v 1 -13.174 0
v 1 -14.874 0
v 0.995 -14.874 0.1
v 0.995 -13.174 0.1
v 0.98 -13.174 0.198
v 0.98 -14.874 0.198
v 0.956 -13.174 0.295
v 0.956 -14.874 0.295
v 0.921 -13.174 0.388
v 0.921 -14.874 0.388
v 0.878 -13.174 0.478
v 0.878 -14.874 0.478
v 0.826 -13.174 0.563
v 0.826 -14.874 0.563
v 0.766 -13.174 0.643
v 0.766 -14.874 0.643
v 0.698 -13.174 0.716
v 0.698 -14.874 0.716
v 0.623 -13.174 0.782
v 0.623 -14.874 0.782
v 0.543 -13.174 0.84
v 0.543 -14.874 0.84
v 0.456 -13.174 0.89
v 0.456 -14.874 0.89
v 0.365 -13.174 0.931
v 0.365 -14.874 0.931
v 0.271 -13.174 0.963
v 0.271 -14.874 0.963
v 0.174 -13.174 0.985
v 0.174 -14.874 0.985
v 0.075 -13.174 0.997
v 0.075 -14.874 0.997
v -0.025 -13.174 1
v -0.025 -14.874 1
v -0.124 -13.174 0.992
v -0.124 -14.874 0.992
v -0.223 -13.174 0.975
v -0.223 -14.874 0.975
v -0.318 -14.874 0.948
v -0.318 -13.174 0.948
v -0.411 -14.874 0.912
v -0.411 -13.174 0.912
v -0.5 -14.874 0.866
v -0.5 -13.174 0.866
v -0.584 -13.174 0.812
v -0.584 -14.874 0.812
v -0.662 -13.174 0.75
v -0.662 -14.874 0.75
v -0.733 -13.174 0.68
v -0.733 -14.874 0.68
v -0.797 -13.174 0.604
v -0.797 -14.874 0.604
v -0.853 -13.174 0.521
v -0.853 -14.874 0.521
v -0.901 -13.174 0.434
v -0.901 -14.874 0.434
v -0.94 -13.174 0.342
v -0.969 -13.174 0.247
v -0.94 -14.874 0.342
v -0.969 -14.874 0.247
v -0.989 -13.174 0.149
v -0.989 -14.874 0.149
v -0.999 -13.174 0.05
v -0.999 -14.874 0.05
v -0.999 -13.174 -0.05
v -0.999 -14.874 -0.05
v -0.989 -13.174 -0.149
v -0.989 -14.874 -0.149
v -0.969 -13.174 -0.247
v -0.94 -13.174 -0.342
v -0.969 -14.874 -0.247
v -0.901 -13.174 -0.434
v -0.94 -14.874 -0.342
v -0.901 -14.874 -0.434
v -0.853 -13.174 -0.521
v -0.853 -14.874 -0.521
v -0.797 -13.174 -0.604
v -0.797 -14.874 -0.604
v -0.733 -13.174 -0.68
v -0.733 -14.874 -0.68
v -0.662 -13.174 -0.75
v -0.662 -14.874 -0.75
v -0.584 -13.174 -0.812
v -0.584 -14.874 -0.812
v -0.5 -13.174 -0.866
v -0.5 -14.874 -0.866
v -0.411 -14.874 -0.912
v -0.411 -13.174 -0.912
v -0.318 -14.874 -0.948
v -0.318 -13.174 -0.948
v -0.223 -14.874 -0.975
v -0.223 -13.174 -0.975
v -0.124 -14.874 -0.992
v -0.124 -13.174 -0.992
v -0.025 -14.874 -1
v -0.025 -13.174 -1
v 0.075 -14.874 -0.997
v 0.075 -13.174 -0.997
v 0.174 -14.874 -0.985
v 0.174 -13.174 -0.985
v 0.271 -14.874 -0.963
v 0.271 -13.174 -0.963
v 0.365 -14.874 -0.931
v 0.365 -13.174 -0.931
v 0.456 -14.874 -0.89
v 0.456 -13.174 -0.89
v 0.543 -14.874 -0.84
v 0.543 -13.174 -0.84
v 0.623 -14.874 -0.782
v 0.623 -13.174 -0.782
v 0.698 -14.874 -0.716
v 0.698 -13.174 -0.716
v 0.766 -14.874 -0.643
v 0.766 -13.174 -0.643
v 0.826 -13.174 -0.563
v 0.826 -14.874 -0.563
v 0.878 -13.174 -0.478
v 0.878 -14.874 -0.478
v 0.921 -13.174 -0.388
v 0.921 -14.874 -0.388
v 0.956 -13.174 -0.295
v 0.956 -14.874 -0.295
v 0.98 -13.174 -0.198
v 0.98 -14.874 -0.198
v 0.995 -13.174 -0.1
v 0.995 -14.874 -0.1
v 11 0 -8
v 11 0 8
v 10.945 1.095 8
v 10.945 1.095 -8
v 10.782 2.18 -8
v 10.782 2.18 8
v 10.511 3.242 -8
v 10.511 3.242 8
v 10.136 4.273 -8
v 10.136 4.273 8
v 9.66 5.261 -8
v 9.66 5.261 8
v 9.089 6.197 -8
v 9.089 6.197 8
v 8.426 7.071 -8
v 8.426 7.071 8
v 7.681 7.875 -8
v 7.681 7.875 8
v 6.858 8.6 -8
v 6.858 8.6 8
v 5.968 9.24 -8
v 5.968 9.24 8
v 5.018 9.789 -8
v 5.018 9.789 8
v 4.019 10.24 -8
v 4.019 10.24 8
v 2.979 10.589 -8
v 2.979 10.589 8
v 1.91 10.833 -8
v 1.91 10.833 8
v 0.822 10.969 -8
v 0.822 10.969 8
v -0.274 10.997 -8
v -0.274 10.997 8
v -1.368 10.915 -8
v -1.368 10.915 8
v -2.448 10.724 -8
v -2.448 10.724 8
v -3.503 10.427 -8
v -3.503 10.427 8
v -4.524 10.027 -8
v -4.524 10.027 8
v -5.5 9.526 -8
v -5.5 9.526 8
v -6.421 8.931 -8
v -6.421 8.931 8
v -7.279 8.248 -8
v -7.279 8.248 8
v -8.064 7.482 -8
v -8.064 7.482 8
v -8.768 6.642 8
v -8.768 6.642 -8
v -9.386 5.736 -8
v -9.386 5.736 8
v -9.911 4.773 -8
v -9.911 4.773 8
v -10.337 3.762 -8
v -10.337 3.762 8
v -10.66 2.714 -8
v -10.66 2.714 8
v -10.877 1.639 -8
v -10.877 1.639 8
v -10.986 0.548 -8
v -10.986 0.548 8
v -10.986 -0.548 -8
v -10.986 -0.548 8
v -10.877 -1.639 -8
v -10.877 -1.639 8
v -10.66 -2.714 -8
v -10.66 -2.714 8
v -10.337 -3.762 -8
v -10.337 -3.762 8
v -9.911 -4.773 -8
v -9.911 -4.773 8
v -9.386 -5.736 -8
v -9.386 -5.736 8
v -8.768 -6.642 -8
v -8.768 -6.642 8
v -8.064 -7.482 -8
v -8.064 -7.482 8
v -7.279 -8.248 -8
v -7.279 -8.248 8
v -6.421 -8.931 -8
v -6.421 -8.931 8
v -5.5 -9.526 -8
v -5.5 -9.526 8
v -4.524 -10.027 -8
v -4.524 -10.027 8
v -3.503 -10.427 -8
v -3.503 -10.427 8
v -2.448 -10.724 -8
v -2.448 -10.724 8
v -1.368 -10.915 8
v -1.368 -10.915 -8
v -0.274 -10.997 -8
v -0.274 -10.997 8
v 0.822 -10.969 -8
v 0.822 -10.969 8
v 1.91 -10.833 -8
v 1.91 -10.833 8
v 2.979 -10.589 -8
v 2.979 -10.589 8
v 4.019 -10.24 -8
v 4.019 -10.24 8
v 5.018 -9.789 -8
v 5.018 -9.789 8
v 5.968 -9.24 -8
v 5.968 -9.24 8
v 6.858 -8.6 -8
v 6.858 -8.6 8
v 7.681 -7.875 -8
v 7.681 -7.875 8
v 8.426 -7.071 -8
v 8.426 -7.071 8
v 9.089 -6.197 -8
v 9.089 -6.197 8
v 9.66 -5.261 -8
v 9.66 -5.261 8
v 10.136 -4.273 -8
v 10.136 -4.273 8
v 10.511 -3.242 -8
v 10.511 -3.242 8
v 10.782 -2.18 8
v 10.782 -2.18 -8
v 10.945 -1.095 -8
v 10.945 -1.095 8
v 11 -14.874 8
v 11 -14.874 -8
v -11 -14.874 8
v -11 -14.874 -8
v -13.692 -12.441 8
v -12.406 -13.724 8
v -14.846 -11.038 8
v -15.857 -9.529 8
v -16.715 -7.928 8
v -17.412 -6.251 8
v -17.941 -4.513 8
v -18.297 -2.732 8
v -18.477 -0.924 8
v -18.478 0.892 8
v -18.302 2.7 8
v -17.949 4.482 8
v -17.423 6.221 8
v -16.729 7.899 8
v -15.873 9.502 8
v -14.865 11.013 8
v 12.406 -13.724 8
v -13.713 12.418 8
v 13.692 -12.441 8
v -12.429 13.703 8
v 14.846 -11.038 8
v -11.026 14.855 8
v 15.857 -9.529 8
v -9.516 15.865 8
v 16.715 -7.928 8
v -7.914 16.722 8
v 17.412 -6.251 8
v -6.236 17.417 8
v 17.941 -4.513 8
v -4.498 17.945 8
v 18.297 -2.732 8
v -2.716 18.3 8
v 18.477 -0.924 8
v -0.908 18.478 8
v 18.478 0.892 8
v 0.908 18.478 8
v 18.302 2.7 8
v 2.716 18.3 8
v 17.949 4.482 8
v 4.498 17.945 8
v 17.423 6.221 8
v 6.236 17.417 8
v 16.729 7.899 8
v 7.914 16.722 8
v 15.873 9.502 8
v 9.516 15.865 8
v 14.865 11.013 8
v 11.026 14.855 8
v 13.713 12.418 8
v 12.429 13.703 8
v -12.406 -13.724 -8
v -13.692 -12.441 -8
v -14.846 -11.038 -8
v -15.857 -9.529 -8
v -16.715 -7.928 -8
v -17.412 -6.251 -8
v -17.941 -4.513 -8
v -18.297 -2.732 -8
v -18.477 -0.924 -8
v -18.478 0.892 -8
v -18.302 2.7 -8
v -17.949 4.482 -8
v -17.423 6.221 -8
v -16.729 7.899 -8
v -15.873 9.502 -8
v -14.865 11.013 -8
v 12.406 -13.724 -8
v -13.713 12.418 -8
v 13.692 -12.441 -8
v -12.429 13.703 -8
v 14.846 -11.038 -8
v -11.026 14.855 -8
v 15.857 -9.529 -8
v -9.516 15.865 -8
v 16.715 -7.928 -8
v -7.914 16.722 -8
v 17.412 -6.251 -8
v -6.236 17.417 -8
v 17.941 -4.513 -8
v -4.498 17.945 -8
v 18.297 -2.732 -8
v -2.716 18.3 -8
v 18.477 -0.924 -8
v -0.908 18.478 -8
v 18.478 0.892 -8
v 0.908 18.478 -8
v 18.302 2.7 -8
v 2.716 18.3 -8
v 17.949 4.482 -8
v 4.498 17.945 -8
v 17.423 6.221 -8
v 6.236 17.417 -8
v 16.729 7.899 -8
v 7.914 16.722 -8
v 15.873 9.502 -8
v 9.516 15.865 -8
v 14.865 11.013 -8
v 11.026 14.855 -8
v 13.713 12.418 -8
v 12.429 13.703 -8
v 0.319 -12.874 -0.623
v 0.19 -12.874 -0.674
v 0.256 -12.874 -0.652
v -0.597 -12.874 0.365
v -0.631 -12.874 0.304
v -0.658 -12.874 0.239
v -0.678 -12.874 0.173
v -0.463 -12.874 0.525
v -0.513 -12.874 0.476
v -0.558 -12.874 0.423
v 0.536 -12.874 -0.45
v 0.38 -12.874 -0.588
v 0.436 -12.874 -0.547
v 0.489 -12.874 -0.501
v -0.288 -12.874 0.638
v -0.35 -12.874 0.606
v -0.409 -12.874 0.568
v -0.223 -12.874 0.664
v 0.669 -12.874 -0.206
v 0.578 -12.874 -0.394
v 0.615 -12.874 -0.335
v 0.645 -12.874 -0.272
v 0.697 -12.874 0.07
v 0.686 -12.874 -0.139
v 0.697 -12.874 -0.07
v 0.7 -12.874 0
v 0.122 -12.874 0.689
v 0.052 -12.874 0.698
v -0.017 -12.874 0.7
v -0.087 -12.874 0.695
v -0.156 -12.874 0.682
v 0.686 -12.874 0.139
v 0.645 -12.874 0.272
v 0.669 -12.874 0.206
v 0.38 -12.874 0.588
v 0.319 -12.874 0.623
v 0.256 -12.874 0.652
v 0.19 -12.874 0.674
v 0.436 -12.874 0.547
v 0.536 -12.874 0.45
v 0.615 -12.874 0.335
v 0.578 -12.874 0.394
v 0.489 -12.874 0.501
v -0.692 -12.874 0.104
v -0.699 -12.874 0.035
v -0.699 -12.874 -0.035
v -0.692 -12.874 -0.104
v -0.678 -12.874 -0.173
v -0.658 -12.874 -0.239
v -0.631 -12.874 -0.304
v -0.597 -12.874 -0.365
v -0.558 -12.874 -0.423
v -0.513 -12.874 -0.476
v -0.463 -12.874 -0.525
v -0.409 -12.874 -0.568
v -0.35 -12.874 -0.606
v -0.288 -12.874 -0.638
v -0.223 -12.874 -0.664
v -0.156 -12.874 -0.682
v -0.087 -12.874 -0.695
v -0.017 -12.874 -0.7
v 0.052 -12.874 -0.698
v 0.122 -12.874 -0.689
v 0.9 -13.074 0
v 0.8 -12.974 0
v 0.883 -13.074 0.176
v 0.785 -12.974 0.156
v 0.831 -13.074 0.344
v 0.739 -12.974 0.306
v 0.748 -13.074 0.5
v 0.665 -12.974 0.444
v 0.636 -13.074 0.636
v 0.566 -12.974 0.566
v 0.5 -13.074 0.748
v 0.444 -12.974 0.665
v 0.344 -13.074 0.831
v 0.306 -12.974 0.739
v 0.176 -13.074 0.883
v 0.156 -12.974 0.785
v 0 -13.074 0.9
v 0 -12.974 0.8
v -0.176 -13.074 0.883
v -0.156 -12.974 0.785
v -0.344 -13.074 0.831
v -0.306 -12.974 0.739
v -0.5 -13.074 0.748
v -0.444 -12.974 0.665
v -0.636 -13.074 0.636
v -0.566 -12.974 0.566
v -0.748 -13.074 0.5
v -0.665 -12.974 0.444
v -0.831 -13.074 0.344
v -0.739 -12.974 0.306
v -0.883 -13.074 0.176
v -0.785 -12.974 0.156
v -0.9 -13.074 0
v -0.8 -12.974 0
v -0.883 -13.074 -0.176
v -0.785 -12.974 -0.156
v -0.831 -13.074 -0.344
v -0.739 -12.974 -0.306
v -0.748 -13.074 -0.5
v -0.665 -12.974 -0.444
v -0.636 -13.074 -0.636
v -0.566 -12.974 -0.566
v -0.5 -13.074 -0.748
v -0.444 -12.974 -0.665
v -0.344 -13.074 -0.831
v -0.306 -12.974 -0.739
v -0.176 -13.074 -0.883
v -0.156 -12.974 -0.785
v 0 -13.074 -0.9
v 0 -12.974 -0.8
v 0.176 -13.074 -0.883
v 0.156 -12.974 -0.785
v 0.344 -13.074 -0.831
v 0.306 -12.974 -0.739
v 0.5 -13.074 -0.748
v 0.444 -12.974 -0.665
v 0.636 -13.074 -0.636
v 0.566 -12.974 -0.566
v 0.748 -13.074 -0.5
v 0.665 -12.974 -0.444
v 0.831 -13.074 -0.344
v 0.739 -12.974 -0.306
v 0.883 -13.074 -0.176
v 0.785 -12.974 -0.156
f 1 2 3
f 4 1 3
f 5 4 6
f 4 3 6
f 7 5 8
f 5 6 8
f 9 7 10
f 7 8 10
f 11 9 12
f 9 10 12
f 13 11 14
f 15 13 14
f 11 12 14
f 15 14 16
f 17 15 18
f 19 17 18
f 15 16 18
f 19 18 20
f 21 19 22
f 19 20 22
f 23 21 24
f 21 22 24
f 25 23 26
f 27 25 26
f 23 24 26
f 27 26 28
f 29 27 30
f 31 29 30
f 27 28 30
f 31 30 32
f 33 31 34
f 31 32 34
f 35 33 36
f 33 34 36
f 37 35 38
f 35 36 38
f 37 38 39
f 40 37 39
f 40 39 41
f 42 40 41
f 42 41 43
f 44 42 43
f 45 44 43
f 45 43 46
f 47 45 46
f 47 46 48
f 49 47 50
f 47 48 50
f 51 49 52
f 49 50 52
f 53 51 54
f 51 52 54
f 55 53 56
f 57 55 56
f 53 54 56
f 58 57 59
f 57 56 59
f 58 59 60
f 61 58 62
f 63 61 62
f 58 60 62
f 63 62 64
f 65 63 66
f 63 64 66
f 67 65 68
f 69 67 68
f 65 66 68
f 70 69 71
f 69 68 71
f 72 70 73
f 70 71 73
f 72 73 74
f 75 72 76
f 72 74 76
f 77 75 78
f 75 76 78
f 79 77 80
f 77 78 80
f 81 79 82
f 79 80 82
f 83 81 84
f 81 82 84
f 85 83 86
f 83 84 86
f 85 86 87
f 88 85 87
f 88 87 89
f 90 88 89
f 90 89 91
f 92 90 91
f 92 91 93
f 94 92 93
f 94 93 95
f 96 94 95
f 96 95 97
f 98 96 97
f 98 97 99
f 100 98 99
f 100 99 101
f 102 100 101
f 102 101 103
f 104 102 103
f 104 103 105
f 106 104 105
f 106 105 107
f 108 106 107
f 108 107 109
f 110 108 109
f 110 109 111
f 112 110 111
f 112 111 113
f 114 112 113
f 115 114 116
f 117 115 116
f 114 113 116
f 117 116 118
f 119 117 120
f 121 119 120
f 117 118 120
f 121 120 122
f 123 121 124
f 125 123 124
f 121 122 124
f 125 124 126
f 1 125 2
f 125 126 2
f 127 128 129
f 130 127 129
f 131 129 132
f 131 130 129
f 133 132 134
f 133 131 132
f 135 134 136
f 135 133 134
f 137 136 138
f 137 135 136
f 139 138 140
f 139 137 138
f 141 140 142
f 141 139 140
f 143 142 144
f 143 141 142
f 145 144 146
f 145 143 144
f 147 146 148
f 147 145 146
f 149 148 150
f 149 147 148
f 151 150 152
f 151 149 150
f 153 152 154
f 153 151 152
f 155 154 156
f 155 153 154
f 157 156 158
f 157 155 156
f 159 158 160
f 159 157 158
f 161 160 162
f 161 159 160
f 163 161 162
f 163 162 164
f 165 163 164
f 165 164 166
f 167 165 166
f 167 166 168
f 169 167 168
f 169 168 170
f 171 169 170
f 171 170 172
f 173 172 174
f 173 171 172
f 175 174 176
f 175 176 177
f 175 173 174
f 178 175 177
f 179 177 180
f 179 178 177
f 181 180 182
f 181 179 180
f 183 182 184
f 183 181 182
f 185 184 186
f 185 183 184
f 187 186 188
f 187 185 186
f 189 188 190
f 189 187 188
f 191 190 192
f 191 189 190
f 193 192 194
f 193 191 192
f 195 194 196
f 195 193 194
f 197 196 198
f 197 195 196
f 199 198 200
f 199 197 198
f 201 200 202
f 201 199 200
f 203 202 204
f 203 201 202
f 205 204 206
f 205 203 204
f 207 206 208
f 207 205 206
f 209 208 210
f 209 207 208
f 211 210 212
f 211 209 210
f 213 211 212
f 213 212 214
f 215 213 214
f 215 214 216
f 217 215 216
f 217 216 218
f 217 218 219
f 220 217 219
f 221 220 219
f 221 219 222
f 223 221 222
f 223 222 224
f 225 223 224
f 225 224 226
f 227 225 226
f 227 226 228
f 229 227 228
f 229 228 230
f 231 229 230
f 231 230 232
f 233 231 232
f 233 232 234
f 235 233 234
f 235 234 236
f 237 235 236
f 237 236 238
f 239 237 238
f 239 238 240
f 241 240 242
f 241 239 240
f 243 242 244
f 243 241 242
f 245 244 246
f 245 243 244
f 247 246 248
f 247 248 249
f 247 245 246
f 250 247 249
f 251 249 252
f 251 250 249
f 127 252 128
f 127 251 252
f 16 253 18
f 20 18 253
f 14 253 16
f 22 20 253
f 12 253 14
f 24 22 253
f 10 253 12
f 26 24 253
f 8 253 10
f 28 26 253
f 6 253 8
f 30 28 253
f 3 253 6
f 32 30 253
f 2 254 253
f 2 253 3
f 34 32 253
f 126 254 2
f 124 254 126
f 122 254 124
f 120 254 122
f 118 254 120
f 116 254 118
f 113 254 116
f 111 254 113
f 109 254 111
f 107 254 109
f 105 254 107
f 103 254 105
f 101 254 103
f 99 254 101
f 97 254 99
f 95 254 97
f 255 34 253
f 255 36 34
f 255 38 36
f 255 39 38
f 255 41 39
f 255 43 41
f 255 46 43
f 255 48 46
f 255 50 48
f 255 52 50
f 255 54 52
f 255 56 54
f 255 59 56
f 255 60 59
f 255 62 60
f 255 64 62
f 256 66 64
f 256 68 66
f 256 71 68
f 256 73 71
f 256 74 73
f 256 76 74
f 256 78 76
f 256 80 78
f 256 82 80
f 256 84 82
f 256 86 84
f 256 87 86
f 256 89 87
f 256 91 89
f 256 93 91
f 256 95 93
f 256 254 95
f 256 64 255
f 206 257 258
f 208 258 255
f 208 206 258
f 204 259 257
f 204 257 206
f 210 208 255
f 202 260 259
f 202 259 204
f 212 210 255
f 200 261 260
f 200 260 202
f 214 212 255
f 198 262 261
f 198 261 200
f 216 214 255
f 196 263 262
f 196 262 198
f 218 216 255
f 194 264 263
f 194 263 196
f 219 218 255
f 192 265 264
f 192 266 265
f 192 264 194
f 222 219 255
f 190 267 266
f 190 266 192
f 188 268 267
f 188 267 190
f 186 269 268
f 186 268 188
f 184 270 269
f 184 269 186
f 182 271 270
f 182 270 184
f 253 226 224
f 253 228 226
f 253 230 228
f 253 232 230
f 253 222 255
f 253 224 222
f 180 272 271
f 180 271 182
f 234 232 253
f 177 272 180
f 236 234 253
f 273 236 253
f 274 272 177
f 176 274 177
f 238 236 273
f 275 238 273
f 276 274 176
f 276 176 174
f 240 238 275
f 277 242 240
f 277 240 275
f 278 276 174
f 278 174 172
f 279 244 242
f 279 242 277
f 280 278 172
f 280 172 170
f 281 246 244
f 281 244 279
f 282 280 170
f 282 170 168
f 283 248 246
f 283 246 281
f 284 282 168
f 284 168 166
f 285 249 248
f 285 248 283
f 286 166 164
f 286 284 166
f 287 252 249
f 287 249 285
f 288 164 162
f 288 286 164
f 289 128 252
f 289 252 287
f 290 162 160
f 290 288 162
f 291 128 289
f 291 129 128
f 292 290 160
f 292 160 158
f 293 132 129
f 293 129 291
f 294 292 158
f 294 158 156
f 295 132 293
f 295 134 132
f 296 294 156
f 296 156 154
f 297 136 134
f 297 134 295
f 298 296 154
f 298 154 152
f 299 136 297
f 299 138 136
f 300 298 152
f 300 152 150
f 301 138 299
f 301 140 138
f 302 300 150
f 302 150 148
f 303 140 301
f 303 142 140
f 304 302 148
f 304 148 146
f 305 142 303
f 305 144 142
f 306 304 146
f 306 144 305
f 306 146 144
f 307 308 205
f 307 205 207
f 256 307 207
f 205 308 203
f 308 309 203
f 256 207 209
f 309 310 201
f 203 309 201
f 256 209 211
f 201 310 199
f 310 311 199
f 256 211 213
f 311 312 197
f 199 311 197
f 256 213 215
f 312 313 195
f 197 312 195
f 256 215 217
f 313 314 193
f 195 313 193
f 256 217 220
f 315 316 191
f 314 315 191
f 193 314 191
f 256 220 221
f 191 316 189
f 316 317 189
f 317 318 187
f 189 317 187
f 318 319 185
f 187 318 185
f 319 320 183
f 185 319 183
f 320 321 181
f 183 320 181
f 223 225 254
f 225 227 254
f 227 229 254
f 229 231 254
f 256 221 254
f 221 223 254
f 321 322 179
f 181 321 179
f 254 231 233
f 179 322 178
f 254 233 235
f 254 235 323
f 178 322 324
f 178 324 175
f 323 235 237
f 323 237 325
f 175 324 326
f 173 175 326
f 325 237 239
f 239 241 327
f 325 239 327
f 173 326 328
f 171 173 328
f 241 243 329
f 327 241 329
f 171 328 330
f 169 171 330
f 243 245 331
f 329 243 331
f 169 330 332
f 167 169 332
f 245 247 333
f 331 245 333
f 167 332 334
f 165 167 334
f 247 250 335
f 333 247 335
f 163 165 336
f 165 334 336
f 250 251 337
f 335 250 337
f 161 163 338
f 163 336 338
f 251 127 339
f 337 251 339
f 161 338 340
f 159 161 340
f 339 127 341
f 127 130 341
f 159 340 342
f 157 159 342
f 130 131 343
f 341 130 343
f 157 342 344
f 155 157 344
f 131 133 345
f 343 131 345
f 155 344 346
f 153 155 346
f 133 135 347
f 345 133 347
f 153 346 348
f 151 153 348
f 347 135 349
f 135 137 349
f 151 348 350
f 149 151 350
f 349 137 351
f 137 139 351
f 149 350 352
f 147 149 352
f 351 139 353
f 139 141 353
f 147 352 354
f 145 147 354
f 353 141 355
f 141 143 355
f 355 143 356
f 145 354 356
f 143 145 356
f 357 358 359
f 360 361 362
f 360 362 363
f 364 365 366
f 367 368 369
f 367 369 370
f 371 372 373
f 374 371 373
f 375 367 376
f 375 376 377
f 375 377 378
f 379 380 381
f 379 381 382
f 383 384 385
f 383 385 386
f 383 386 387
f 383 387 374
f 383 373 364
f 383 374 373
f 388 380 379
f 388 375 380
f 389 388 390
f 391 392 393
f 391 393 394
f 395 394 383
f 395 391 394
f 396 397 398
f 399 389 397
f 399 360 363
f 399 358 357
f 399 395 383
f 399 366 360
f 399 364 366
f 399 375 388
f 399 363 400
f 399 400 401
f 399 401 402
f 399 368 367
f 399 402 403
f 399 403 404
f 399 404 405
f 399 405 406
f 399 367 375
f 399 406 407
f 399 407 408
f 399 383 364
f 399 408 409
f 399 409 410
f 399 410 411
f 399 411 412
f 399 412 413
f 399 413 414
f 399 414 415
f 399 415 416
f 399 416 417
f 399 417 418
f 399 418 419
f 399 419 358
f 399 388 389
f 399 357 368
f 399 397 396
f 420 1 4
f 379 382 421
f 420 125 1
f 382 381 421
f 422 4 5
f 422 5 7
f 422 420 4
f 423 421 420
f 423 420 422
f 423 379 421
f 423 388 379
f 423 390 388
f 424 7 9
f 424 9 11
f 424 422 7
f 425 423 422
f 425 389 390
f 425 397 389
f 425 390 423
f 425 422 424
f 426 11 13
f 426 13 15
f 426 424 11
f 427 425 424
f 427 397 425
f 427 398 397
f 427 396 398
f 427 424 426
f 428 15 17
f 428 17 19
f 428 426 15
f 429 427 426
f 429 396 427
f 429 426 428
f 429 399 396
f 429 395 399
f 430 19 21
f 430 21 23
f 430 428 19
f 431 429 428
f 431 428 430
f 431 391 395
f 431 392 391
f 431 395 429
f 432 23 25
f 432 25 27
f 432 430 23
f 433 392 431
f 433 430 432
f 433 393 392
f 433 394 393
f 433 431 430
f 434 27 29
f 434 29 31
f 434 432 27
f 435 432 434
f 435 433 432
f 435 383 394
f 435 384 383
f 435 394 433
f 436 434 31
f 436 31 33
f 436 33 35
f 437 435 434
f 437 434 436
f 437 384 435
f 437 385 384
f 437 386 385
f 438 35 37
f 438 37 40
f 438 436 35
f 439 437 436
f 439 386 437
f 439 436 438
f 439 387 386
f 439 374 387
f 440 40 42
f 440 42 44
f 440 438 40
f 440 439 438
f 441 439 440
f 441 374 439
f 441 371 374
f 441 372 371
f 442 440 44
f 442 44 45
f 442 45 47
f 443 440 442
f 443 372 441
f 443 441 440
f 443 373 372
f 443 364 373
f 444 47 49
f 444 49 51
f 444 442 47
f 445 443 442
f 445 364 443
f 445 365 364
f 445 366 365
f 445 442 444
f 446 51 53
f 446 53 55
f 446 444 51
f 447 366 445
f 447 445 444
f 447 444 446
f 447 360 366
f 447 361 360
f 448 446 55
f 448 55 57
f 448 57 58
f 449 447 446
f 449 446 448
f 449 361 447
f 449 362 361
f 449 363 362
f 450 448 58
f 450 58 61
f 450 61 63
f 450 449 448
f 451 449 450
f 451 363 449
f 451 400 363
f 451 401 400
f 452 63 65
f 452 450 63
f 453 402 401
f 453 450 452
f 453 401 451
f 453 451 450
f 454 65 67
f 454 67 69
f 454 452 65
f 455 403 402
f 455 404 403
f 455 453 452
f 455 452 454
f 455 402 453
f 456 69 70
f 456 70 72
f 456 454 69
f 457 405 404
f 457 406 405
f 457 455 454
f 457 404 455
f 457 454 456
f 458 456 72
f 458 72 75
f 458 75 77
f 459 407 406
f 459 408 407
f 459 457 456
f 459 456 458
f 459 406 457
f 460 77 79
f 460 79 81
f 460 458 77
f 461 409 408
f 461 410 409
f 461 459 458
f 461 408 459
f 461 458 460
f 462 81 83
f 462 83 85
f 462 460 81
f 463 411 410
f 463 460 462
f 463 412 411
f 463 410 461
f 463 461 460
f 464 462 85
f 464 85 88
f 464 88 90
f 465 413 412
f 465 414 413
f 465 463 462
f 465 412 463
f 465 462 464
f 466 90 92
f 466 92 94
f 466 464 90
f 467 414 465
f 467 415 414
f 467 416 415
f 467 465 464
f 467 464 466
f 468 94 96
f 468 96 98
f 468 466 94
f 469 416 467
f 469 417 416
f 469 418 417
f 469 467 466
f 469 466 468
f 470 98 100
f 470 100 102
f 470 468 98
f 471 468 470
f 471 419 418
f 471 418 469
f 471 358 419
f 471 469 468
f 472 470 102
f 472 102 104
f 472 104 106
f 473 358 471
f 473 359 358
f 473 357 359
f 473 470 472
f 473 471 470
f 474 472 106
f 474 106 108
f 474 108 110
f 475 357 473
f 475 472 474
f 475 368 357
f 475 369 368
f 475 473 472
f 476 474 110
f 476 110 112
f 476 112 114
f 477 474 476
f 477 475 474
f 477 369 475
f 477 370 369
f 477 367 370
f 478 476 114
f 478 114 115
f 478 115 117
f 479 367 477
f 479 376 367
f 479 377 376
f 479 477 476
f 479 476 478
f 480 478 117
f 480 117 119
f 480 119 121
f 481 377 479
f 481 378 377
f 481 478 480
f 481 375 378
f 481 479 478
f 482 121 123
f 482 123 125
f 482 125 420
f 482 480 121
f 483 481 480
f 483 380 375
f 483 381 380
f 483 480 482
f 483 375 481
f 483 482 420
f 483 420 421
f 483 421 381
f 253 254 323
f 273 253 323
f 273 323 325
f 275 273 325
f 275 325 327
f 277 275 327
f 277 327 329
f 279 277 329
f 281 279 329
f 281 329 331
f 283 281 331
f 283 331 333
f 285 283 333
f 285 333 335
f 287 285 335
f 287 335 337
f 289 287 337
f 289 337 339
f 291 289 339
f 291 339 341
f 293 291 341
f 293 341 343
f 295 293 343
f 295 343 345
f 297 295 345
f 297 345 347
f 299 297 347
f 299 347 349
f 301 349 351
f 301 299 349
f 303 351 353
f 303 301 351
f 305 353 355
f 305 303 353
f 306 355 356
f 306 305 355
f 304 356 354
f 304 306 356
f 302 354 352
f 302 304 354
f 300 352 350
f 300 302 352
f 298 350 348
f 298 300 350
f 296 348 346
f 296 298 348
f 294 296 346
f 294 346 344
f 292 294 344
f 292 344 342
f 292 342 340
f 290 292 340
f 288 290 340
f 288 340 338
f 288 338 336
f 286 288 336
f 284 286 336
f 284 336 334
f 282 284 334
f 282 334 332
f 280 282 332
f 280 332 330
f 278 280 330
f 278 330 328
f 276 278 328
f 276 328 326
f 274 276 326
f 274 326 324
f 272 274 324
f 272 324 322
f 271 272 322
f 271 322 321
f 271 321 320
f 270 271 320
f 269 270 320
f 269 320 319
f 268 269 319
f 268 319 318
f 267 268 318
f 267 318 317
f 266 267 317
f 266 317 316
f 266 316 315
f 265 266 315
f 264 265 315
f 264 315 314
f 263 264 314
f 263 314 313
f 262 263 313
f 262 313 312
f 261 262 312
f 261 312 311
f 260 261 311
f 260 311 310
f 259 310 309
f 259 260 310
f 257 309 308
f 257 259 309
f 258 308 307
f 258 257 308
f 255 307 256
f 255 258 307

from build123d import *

# Parameters (mm, degrees)
SKETCH1_R           = 18.5
SKETCH1_R_2         = 11
BOSS_EXTRUDE1_DEPTH = 8
CUT_EXTRUDE1_DEPTH  = 16
SKETCH4_R           = 1
CUT_EXTRUDE2_DEPTH  = 2
CHAMFER1_SIZE       = 0.3


with BuildPart() as part:
    # Sketch1 → Boss-Extrude1 (new body, symmetric)
    with BuildSketch(Plane.XY):
        Circle(SKETCH1_R)
        Circle(SKETCH1_R_2, mode=Mode.SUBTRACT)
    extrude(amount=BOSS_EXTRUDE1_DEPTH, both=True)

    # Sketch3 → Cut-Extrude1 (cut)
    with BuildSketch(Plane(origin=(0, 0, -8), x_dir=(-1, 0, 0), z_dir=(0, 0, -1))):
        with BuildLine():
            Line((-11, -14.874474781), (11, -14.874474781))
            ThreePointArc((11, -14.874474781), (0, -18.5), (-11, -14.874474781))
        make_face()
    extrude(amount=-CUT_EXTRUDE1_DEPTH, mode=Mode.SUBTRACT)

    # Sketch4 → Cut-Extrude2 (cut)
    with BuildSketch(Plane.XZ.offset(14.874474781)):
        Circle(SKETCH4_R)
    extrude(amount=-CUT_EXTRUDE2_DEPTH, mode=Mode.SUBTRACT)

    # Chamfer1
    chamfer1_edges = [part.edges().sort_by_distance(p)[0] for p in [
        (-1, -12.874474781, 0),
    ]]
    chamfer(chamfer1_edges, length=CHAMFER1_SIZE)


solid = part.part
